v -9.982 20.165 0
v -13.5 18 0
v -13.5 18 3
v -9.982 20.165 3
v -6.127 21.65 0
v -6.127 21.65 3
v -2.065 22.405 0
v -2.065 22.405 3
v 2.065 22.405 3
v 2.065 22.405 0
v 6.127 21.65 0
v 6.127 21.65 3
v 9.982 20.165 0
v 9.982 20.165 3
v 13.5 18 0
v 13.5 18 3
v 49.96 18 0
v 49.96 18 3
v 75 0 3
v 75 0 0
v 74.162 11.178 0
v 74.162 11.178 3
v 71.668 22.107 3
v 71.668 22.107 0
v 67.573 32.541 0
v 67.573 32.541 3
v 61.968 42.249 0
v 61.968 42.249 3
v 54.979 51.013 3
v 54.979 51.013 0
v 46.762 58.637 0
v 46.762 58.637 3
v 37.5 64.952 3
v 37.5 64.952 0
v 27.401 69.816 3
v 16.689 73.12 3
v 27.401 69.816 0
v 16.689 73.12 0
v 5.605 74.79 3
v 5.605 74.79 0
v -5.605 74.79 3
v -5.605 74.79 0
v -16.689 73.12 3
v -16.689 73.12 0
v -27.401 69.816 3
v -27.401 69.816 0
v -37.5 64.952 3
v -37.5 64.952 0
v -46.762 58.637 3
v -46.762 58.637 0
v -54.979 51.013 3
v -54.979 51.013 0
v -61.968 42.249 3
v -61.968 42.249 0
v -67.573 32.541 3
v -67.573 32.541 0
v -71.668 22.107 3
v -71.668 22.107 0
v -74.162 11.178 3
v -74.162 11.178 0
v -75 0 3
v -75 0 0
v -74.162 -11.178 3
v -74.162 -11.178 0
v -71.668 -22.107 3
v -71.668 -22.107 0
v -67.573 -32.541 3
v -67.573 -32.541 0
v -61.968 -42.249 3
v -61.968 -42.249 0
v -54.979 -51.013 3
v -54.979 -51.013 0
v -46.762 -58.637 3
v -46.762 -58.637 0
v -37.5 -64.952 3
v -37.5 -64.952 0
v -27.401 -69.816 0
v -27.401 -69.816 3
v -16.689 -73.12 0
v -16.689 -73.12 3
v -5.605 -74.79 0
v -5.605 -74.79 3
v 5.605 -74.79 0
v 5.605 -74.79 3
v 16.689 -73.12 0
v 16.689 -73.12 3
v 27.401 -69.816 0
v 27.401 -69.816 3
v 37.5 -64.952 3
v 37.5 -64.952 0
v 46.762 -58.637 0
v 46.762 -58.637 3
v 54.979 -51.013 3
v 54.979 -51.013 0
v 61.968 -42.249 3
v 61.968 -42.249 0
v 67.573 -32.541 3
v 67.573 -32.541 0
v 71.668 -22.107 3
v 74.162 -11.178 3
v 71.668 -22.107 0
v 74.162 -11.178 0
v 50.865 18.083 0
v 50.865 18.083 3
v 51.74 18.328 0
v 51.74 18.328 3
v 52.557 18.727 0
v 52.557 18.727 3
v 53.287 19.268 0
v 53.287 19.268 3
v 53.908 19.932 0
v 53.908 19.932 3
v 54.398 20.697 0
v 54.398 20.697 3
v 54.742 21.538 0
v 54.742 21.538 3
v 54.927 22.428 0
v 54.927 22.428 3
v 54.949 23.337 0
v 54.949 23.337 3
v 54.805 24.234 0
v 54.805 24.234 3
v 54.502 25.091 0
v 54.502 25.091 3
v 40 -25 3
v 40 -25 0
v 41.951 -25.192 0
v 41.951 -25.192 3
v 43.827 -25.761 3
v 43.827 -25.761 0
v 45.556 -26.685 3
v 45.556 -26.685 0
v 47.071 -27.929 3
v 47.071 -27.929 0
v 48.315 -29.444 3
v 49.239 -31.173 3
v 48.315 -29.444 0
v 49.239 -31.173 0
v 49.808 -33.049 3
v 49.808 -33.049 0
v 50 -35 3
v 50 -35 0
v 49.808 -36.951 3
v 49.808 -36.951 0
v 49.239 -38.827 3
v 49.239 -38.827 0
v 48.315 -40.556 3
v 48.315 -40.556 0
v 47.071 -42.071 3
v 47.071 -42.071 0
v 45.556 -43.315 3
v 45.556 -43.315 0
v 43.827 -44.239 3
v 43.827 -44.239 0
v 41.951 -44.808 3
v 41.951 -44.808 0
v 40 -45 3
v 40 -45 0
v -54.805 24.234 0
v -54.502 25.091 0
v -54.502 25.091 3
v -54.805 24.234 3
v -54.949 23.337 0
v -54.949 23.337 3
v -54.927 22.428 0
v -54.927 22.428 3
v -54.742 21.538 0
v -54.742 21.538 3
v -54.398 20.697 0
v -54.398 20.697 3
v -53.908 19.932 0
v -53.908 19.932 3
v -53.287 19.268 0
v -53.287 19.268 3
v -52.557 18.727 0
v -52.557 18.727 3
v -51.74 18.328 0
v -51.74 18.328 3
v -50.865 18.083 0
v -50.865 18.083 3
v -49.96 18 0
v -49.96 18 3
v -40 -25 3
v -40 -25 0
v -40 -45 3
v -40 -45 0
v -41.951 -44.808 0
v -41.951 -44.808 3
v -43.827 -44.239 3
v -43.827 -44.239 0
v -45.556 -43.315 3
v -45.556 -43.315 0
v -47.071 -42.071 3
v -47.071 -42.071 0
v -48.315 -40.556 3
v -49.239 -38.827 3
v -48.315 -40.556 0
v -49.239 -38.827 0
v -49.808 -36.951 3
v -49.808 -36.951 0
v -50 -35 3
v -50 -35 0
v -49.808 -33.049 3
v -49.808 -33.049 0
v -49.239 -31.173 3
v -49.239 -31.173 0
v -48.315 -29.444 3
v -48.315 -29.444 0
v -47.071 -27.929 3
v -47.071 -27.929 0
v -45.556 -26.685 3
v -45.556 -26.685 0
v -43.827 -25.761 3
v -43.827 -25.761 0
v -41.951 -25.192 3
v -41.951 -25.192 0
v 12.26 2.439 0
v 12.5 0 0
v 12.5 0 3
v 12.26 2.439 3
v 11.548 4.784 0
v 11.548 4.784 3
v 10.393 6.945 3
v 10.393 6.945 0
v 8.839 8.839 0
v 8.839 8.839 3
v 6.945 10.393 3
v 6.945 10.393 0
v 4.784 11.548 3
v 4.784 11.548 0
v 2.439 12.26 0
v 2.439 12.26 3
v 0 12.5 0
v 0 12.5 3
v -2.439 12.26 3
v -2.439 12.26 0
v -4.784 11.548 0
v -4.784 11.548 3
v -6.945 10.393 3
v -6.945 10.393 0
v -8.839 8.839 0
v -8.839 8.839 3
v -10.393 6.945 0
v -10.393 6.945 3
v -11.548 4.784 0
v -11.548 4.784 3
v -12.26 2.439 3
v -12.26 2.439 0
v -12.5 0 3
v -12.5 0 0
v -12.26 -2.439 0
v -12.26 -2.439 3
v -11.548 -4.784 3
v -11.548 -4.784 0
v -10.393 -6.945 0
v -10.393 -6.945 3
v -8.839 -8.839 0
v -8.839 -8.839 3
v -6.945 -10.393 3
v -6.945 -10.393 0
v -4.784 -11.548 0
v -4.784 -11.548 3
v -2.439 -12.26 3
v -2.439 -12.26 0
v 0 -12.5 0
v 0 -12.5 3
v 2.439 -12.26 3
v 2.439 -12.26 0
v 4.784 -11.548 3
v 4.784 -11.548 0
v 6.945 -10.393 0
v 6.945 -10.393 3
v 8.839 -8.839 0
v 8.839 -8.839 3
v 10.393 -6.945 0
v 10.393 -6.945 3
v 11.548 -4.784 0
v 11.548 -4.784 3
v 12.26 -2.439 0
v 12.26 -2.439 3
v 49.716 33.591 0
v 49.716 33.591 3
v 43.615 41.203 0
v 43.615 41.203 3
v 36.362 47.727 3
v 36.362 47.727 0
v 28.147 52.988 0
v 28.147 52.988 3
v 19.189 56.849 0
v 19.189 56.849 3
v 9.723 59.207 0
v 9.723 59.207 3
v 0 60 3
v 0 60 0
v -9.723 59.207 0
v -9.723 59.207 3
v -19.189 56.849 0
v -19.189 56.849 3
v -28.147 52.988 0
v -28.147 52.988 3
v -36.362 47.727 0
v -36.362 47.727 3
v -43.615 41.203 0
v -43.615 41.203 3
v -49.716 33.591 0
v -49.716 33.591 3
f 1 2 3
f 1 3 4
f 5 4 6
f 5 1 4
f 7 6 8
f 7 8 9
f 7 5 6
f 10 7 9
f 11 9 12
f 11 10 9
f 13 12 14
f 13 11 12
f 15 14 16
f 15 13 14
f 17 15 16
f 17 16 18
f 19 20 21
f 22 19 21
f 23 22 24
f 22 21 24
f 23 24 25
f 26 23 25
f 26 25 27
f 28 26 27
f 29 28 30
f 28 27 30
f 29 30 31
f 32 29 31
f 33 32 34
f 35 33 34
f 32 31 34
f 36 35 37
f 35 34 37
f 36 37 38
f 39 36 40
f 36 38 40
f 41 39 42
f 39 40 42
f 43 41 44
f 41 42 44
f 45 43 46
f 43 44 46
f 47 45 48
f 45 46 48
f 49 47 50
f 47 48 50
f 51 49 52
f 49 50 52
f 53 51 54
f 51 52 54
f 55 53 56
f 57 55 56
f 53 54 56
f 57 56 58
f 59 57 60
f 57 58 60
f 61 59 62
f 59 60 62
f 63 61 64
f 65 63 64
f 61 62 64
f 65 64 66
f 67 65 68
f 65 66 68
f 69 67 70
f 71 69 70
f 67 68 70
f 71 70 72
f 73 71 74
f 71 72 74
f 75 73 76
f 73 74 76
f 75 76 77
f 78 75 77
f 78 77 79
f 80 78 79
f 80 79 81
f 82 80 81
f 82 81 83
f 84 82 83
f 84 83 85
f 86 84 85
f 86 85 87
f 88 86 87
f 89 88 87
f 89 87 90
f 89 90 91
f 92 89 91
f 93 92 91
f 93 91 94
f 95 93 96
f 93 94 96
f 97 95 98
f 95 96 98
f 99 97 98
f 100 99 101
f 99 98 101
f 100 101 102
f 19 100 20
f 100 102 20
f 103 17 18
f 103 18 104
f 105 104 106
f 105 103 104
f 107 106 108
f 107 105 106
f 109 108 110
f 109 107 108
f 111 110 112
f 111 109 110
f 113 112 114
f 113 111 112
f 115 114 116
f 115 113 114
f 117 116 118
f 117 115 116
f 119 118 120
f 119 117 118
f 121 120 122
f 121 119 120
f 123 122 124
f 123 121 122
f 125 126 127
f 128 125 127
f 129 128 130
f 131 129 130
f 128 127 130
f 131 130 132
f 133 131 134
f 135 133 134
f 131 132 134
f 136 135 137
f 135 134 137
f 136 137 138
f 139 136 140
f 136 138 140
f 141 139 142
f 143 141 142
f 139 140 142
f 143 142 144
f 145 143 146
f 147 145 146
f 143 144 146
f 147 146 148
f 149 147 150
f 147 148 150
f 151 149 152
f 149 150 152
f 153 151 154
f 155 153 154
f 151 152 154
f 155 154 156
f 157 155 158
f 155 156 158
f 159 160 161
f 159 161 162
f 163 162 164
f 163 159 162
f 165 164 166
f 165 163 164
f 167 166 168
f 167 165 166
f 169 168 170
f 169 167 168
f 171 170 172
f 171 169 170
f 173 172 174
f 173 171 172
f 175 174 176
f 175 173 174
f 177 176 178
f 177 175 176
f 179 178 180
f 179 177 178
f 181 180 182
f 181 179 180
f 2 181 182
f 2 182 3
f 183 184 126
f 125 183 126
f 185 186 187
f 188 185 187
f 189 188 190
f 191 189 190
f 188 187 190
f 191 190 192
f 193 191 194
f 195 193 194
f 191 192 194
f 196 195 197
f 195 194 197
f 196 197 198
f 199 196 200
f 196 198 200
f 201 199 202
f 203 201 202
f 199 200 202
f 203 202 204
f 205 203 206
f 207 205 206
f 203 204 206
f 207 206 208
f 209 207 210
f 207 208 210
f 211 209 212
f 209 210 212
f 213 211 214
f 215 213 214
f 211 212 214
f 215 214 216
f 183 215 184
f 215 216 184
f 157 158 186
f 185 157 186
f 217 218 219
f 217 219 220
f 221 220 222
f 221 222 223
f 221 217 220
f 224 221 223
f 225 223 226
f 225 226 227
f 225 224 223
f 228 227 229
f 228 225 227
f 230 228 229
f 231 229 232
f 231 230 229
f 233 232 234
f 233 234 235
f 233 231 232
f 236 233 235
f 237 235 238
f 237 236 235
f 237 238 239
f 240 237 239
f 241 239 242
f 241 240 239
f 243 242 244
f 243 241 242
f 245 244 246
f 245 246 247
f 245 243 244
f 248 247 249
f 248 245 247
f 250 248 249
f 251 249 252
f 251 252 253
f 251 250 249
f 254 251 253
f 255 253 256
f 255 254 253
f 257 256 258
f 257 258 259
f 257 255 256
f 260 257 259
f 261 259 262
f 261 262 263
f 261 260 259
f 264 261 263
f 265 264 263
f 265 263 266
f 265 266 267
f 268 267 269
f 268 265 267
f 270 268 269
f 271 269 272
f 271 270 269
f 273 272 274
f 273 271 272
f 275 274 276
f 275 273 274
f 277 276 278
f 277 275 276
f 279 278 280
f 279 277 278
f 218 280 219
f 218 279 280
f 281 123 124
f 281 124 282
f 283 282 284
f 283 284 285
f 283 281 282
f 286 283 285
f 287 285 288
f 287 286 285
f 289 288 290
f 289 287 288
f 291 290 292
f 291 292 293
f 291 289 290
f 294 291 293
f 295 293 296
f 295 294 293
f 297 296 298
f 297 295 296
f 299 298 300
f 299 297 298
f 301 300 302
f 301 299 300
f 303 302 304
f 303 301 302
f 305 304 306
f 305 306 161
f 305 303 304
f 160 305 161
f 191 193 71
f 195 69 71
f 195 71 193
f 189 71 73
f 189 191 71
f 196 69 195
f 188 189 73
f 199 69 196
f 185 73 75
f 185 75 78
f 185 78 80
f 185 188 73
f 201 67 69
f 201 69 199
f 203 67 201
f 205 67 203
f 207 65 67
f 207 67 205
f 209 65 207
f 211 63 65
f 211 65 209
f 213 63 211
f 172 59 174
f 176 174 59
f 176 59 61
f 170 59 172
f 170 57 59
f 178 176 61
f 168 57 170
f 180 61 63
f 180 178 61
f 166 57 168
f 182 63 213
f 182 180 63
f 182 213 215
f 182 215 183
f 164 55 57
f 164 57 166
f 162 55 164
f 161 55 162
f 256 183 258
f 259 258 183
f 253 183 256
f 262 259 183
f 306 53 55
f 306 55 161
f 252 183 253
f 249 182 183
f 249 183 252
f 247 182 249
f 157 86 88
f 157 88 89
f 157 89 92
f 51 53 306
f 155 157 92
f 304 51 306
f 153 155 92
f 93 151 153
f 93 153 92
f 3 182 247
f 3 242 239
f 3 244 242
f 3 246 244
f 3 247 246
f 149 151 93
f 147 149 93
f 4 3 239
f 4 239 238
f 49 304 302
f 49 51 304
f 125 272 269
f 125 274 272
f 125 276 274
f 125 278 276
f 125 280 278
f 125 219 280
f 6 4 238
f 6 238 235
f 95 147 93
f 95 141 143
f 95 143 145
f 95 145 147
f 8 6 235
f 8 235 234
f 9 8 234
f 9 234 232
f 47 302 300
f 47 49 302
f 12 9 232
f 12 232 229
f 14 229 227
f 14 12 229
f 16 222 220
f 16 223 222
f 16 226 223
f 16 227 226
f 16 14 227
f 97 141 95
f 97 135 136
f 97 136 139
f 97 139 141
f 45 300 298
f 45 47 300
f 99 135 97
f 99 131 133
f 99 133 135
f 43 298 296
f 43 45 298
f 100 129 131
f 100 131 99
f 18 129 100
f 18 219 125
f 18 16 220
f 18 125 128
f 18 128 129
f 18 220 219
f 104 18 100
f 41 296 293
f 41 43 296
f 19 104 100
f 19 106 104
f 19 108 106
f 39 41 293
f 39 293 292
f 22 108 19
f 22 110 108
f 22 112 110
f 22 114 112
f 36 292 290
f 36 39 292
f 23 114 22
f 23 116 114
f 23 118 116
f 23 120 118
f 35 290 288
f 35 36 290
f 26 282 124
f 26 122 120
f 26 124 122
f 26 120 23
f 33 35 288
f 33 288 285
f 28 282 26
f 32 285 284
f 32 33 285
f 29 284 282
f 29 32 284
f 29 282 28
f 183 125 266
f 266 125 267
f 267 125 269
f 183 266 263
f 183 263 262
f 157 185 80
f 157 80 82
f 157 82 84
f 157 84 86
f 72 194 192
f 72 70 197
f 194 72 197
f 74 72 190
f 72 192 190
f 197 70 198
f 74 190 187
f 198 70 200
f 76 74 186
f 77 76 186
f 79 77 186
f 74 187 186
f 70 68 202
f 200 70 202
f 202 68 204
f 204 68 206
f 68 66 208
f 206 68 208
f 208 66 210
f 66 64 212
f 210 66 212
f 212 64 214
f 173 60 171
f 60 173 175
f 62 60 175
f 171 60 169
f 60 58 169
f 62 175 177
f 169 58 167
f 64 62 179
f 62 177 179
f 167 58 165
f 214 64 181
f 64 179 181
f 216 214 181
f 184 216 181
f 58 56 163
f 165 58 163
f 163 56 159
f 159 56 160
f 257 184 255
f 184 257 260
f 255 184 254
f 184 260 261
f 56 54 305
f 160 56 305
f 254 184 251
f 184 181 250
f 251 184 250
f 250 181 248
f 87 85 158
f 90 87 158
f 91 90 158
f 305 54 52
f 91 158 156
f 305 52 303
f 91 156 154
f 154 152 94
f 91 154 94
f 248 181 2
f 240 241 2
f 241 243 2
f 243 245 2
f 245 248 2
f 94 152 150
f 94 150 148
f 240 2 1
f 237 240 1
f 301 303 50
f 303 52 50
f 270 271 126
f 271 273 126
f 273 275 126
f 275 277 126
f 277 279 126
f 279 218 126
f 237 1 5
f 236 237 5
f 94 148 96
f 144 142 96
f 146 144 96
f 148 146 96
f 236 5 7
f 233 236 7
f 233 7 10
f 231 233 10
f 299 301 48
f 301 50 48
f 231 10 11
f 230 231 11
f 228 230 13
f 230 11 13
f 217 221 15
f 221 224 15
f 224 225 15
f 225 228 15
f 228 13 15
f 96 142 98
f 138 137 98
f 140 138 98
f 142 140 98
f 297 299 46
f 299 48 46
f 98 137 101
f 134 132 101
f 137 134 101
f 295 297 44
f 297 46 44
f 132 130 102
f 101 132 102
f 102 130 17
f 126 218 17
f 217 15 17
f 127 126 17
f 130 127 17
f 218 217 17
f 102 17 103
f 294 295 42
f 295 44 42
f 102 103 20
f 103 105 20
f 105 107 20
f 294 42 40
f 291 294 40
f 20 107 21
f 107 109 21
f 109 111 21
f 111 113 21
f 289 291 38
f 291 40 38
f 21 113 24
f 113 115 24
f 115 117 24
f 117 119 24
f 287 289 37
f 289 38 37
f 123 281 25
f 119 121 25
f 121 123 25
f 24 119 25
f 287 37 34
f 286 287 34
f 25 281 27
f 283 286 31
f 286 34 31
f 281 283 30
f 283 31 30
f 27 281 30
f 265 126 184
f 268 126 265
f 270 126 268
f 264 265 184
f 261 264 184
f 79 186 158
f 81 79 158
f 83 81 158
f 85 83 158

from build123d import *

# Parameters (mm, degrees)
SKETCH1_R           = 75
SKETCH1_R_2         = 12.5
BOSS_EXTRUDE1_DEPTH = 3


with BuildPart() as part:
    # Sketch1 → Boss-Extrude1 (new body)
    with BuildSketch(Plane.XY):
        Circle(SKETCH1_R)
        Circle(SKETCH1_R_2, mode=Mode.SUBTRACT)
        with BuildLine():
            Line((-40, -25), (40, -25))
            ThreePointArc((40, -25), (50, -35), (40, -45))
            Line((40, -45), (-40, -45))
            ThreePointArc((-40, -45), (-50, -35), (-40, -25))
        make_face(mode=Mode.SUBTRACT)
        with BuildLine():
            Line((-49.959983987, 18), (-13.5, 18))
            ThreePointArc((-13.5, 18), (0, 22.5), (13.5, 18))
            Line((13.5, 18), (49.959983987, 18))
            ThreePointArc((49.959983987, 18), (54.170360779, 20.30320055), (54.501800713, 25.090909091))
            ThreePointArc((54.501800713, 25.090909091), (0, 60), (-54.501800713, 25.090909091))
            ThreePointArc((-54.501800713, 25.090909091), (-54.170360779, 20.30320055), (-49.959983987, 18))
        make_face(mode=Mode.SUBTRACT)
    extrude(amount=BOSS_EXTRUDE1_DEPTH)


solid = part.part
